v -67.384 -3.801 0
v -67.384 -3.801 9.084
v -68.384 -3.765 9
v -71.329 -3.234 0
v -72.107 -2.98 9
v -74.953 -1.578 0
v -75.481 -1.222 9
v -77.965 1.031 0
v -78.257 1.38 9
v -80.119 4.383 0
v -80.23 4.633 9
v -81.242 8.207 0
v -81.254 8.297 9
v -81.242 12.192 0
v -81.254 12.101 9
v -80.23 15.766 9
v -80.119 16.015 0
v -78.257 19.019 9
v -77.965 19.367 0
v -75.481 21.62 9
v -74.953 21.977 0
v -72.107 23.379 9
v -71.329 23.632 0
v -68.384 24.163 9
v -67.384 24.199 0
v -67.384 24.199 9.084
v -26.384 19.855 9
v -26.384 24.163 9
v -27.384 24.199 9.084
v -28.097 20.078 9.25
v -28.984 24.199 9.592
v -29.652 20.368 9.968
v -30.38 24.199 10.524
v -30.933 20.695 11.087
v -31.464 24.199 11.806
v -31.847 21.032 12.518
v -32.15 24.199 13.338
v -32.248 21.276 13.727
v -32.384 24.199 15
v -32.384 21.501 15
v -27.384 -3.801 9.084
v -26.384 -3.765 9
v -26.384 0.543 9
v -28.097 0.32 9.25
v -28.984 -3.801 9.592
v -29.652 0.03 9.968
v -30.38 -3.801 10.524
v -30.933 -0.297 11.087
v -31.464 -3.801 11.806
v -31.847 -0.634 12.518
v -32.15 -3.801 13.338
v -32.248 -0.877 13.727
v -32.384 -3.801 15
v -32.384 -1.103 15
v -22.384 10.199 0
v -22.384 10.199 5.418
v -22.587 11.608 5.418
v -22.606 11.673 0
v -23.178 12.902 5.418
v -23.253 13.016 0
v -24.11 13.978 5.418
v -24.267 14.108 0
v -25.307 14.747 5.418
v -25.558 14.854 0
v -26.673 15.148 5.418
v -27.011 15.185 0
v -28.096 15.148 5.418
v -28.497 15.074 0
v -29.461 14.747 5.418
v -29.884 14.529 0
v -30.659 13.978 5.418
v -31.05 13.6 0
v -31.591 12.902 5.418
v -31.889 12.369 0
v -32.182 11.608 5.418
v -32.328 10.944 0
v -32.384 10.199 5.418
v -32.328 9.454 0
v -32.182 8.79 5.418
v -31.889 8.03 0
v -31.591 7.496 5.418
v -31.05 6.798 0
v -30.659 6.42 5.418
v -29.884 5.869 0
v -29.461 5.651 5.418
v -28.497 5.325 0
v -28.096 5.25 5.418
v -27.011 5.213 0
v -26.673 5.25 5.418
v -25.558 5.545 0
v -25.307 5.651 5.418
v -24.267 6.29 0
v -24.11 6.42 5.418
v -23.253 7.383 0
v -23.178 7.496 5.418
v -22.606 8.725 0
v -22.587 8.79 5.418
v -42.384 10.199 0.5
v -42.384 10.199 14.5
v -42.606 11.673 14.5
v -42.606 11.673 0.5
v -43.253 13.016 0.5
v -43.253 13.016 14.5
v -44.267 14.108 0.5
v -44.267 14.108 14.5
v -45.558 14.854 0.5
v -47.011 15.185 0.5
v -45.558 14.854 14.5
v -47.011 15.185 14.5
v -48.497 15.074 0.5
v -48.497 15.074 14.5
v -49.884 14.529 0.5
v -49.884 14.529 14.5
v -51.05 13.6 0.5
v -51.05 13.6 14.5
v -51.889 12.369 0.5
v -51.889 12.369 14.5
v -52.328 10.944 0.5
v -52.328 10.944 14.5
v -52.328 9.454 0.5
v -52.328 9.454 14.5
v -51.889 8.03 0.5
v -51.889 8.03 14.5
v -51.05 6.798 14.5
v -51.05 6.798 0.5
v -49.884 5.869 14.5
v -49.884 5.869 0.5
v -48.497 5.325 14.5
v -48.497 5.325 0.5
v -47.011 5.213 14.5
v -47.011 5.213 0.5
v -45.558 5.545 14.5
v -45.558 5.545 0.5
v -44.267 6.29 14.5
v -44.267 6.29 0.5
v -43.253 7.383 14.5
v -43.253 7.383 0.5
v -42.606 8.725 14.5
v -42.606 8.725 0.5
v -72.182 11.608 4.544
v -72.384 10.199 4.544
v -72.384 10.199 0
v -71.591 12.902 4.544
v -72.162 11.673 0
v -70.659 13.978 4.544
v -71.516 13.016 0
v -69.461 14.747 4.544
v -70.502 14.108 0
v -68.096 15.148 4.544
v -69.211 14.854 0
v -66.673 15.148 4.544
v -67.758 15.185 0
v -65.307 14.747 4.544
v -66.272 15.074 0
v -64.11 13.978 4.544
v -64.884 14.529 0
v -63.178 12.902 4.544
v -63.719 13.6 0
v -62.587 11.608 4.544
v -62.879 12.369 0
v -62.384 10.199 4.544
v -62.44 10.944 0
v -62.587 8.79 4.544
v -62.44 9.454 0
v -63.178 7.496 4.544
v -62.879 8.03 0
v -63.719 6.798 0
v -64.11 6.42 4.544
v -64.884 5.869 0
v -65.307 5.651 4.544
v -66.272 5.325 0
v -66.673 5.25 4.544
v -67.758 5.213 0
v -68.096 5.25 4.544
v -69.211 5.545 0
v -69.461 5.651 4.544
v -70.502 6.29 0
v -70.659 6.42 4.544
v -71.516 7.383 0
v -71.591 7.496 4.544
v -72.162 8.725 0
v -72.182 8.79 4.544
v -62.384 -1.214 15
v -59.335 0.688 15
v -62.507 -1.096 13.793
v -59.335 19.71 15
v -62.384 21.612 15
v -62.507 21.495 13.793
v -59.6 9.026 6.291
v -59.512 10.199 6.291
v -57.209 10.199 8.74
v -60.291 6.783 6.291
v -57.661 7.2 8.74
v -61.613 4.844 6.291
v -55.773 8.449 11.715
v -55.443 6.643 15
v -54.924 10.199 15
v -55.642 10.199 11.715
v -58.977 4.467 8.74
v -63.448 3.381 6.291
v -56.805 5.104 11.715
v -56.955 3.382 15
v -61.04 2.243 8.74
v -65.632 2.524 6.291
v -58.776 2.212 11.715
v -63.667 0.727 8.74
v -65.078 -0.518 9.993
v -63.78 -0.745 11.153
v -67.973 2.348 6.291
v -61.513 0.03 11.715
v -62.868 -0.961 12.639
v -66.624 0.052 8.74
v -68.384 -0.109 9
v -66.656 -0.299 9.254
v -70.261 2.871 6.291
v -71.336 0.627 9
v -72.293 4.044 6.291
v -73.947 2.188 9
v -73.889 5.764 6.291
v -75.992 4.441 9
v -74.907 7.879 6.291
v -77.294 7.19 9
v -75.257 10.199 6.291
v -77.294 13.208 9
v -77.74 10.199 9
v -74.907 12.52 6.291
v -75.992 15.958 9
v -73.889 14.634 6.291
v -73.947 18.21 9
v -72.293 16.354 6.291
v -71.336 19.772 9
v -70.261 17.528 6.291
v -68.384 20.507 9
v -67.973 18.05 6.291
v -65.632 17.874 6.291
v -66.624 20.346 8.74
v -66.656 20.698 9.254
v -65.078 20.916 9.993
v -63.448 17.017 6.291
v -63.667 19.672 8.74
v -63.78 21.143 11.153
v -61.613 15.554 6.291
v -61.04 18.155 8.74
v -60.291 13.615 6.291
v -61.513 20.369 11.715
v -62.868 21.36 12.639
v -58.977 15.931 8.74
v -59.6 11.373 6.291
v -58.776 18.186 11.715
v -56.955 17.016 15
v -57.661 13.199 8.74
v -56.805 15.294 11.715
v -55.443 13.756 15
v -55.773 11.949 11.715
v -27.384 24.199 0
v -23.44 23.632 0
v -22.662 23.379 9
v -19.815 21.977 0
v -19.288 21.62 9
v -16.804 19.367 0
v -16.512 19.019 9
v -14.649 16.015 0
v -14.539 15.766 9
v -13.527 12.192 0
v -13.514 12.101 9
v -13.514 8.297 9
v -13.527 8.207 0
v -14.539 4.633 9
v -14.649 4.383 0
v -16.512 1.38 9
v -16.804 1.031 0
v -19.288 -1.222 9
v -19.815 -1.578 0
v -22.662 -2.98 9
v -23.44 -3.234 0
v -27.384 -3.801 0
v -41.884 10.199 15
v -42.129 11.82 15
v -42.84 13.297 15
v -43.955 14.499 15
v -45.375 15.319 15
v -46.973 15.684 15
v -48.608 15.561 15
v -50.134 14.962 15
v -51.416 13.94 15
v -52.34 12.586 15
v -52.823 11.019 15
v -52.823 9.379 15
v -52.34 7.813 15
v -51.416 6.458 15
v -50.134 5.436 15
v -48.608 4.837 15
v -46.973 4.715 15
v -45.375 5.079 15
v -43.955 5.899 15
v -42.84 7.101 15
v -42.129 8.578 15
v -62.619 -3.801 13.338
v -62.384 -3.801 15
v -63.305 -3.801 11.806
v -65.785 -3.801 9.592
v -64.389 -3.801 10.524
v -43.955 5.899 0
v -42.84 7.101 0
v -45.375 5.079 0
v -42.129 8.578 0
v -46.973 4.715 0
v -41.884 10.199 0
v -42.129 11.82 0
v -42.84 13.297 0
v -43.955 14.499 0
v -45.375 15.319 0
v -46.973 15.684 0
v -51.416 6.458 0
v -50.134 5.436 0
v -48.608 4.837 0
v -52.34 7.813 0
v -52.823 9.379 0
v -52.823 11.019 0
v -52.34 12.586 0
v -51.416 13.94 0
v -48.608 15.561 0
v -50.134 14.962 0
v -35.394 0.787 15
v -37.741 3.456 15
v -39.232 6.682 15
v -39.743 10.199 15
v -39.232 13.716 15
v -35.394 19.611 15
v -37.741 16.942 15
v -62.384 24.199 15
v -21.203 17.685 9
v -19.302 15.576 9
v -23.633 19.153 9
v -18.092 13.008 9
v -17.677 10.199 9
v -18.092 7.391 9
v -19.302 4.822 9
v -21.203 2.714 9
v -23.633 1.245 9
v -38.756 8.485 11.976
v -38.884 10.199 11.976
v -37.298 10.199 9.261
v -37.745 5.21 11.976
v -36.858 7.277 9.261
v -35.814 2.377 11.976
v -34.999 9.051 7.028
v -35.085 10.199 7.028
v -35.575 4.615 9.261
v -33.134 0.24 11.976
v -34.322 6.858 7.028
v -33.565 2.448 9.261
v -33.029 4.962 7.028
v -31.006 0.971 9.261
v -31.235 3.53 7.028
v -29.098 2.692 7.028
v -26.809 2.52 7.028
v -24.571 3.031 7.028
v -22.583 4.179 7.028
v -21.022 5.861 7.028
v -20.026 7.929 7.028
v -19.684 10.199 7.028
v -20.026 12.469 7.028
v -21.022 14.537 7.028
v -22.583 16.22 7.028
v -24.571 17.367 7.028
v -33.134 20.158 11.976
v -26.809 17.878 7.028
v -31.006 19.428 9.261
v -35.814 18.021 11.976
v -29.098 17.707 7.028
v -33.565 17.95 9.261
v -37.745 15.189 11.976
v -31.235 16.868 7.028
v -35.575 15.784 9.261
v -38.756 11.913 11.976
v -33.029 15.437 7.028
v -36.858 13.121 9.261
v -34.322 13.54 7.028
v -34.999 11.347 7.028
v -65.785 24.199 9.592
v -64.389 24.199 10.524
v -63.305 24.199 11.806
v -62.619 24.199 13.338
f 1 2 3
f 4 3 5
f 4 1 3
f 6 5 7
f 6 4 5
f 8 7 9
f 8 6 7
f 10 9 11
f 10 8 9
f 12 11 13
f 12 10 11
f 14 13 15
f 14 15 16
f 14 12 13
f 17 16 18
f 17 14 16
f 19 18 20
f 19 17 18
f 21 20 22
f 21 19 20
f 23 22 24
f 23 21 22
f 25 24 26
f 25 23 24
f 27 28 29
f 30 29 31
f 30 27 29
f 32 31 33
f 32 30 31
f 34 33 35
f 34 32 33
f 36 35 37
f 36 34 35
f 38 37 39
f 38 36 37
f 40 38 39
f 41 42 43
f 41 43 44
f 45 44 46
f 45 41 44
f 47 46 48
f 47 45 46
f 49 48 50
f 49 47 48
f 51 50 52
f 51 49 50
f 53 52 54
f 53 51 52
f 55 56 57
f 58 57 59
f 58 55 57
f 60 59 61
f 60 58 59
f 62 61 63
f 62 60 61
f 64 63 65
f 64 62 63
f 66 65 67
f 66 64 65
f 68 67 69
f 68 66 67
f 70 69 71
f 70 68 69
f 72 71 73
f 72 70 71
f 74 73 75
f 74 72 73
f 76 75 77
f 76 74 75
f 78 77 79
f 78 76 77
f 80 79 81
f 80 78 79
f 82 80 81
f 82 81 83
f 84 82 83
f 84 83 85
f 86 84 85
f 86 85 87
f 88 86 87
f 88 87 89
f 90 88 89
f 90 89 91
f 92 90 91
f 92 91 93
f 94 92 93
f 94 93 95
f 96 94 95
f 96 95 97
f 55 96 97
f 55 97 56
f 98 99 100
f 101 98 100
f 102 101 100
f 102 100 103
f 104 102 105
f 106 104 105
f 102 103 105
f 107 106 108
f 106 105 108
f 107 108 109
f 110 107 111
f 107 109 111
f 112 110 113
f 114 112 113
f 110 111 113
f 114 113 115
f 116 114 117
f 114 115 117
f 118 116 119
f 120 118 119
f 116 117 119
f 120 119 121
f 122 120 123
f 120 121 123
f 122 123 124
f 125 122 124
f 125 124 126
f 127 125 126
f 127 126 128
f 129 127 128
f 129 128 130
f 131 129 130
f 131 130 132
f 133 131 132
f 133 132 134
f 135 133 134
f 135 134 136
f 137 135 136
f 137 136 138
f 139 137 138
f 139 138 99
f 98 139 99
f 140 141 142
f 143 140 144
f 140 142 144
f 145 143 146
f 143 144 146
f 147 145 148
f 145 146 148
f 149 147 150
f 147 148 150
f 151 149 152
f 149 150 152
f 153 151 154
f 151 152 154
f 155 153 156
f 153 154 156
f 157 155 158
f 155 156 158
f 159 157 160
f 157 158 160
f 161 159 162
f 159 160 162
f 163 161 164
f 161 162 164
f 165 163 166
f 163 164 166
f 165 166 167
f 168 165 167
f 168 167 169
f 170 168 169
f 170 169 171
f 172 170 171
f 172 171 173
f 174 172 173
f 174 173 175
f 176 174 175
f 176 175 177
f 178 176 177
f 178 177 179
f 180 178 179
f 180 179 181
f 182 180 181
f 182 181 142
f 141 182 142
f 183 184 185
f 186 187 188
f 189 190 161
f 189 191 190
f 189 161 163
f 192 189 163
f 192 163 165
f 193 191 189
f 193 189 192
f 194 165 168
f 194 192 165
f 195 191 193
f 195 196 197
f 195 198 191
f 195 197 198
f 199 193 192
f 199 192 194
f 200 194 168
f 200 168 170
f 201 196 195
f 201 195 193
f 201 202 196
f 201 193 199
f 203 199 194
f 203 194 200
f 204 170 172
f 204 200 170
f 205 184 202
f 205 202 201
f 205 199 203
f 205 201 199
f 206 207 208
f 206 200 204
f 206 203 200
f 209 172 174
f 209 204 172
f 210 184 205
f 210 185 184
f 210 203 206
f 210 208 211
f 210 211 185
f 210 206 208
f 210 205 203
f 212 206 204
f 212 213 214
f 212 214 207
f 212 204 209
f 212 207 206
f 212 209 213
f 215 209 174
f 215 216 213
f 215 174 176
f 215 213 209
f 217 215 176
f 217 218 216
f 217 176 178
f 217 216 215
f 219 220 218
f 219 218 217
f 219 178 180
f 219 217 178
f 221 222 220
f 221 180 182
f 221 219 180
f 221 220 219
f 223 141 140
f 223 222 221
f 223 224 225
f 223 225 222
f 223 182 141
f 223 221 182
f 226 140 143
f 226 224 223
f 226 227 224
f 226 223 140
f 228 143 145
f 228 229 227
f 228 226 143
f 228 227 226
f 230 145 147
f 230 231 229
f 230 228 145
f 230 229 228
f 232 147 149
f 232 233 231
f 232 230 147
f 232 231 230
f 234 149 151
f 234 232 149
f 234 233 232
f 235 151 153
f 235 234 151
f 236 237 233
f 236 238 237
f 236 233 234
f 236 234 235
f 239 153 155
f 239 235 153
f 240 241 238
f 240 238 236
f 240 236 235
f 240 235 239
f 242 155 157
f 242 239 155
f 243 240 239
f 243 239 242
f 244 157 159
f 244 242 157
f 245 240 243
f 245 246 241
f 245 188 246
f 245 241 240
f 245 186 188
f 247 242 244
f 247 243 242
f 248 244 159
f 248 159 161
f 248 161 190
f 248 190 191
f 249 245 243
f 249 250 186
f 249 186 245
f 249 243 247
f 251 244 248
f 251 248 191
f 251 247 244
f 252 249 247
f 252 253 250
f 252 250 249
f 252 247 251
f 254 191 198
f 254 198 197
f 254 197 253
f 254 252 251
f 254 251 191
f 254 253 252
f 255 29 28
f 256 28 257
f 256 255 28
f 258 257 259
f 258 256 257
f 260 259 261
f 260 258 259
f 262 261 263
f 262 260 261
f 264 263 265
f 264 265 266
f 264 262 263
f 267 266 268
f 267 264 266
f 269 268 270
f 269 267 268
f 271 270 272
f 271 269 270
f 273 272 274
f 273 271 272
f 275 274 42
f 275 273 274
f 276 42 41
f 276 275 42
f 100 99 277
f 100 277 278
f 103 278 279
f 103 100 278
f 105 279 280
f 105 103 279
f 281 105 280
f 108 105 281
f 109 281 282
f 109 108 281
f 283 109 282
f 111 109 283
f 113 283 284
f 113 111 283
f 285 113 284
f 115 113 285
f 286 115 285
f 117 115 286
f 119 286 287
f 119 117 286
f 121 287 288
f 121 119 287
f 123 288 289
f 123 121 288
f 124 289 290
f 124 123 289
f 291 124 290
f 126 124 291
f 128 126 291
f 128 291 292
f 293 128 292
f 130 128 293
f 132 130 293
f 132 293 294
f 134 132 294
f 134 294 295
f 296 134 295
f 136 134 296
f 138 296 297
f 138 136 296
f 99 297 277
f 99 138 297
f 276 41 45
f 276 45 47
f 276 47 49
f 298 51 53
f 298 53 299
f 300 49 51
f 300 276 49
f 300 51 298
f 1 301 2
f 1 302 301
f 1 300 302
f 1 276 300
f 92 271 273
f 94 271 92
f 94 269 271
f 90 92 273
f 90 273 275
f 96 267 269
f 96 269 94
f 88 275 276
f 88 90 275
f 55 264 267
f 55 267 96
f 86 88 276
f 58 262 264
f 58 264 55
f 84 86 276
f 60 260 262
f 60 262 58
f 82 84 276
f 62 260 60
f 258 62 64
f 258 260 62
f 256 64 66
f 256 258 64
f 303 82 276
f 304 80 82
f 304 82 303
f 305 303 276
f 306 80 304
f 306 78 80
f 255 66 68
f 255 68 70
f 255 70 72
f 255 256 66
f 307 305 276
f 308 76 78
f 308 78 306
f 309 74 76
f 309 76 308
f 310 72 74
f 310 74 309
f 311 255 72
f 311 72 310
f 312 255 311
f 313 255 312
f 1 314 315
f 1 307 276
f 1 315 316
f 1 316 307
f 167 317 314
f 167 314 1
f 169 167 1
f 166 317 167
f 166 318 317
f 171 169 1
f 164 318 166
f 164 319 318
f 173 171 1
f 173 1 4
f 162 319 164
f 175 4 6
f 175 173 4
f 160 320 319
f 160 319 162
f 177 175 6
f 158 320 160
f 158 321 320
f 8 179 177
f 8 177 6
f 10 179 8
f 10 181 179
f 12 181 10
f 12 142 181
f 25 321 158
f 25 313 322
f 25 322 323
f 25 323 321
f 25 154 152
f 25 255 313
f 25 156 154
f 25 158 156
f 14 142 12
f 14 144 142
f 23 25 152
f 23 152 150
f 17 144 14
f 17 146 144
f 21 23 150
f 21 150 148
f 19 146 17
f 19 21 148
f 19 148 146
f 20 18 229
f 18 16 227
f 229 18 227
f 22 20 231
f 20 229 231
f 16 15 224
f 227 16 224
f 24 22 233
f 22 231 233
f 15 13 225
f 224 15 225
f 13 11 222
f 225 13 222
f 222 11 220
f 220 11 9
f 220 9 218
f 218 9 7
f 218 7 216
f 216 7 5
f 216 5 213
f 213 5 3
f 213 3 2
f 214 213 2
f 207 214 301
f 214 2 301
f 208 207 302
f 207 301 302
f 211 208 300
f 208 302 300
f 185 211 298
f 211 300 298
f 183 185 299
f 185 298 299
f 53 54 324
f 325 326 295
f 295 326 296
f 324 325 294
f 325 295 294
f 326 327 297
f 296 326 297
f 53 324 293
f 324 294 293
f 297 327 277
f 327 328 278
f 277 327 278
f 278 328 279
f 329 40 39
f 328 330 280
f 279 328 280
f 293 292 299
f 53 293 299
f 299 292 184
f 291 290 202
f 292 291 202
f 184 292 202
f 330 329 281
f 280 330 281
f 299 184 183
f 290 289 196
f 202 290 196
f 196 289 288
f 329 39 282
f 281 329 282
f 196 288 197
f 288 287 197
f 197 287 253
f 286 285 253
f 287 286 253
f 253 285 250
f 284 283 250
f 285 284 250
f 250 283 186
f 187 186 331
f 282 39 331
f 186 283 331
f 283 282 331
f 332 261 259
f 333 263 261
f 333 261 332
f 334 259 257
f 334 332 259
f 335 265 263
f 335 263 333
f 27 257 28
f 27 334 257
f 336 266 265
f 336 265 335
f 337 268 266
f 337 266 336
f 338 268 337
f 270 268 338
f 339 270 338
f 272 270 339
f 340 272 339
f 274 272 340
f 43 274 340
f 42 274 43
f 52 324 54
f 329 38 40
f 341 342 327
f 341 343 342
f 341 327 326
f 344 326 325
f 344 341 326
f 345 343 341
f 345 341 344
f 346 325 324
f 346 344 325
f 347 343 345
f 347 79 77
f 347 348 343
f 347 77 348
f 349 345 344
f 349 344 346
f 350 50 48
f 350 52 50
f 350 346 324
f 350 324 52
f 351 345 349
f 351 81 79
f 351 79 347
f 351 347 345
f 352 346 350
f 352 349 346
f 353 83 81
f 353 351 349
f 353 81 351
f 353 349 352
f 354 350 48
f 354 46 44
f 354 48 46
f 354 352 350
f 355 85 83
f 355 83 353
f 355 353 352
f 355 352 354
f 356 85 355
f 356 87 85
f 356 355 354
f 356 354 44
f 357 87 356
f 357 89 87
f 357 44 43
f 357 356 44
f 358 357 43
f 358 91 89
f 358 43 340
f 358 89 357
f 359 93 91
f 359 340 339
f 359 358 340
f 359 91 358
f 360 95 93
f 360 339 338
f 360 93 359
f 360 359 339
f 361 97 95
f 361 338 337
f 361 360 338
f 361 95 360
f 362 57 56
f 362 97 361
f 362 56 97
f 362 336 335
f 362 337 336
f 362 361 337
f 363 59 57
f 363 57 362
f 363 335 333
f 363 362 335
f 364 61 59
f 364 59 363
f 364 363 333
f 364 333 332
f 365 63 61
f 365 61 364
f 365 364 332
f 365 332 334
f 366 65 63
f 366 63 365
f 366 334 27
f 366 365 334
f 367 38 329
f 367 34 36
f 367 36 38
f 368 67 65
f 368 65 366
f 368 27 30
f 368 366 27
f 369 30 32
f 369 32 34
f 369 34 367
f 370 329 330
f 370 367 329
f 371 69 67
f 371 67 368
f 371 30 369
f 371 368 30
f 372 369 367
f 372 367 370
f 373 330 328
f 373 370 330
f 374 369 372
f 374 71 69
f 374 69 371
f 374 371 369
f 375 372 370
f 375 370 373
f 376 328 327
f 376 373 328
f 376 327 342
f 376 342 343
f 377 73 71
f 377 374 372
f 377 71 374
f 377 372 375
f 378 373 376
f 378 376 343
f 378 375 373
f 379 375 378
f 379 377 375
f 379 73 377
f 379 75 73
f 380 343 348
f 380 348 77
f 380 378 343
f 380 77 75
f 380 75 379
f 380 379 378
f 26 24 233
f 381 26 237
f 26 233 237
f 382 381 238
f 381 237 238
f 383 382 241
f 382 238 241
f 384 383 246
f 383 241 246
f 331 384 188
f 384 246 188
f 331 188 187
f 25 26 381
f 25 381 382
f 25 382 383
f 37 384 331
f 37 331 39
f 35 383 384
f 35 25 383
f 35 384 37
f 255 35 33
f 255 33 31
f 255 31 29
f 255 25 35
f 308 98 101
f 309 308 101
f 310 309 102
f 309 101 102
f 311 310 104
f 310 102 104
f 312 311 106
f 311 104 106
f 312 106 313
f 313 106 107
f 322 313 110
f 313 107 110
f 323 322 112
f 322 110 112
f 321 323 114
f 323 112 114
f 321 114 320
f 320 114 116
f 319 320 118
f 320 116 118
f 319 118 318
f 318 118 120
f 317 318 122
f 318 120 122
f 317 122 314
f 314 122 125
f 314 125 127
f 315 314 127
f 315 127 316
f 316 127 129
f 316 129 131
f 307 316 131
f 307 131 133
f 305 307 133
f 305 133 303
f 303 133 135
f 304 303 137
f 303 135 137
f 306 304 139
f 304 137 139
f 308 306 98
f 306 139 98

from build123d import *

# Parameters (mm, degrees)
BOSS_EXTRU_1_DEPTH           = 15
ENL_V_MAT_EXTRU_2_REACH      = 89.364
ENL_V_MAT_EXTRU_3_REACH      = 88.221
ESQUISSE8_R                  = 5
CHANFREIN1_SIZE              = 0.5
ENL_V_MAT_EXTRU_4_REACH      = 88.221
ENL_V_MAT_EXTRU_4_END_RADIUS = 12.5
ESQUISSE9_R                  = 5
SYM_TRIE2_OUTLINE_R          = 5
SYM_TRIE2_DEPTH              = 5.418281221


# Read off the part's stored shape, not the designer's step: Symétrie2
with BuildPart() as part:
    # Esquisse1 → Boss.-Extru.1 (new body)
    with BuildSketch(Plane.XY):
        with BuildLine():
            Line((-67.384328638, 24.199161074), (-27.384328638, 24.199161074))
            ThreePointArc((-27.384328638, 24.199161074), (-13.384328638, 10.199161074), (-27.384328638, -3.800838926))
            Line((-27.384328638, -3.800838926), (-67.384328638, -3.800838926))
            ThreePointArc((-67.384328638, -3.800838926), (-81.384328638, 10.199161074), (-67.384328638, 24.199161074))
        make_face()
    extrude(amount=BOSS_EXTRU_1_DEPTH)

    # Esquisse3 → Enlèvement de matière-Révolution1 (revolve, cut)
    with BuildSketch(Plane(origin=(0, 10.199161074, 0), x_dir=(-1, 0, 0), z_dir=(0, 1, 0))):
        with BuildLine():
            Line((67.384328638, 28.5), (67.384328638, 3.5))
            ThreePointArc((67.384328638, 3.5), (54.884328638, 16), (67.384328638, 28.5))
        make_face()
    revolve(axis=Axis((-67.384328638, 10.199161074, 28.5), (0, 0, -1)), mode=Mode.SUBTRACT)

    # Esquisse4 → Enlèvement de matière-Révolution2 (revolve, cut)
    with BuildSketch(Plane(origin=(0, 10.199161074, 0), x_dir=(-1, 0, 0), z_dir=(0, 1, 0))):
        with BuildLine():
            Line((27.384328638, 4.374720358), (27.384328638, 29.374720358))
            ThreePointArc((27.384328638, 29.374720358), (39.884328638, 16.874720358), (27.384328638, 4.374720358))
        make_face()
    revolve(axis=Axis((-27.384328638, 10.199161074, 4.374720358), (0, 0, 1)), mode=Mode.SUBTRACT)

    # Esquisse5 → Enlèv. mat.-Extru.2 (cut, up to next)
    with BuildSketch(Plane.XZ.offset(3.800838926), mode=Mode.PRIVATE) as enl_v_mat_extru_2_sk1:
        with BuildLine():
            Line((-63.278251084, 15), (-87.523217527, 15))
            Line((-87.523217527, 15), (-87.523217527, 9))
            Line((-87.523217527, 9), (-68.384328638, 9))
            ThreePointArc((-68.384328638, 9), (-64.141687951, 10.757359313), (-62.384328638, 15))
            Line((-62.384328638, 15), (-63.278251084, 15))
        make_face()
    enl_v_mat_extru_2_tool1 = extrude(enl_v_mat_extru_2_sk1.sketch, amount=-ENL_V_MAT_EXTRU_2_REACH, mode=Mode.PRIVATE) & part.part
    enl_v_mat_extru_2 = enl_v_mat_extru_2_tool1.solids().sort_by_distance((-75.559983, -3.800839, 12.089604))[0]
    add(enl_v_mat_extru_2, mode=Mode.SUBTRACT)

    # Symétrie1: Enlèv. mat.-Extru.2 mirrored; each copy of Enlèv. mat.-Extru.2 runs up to whatever stops it at its own place
    sym_trie1_before = part.part  # the part as the pattern finds it: every copy runs up to it
    sym_trie1_enl_v_mat_extru_2_long = extrude(enl_v_mat_extru_2_sk1.sketch, amount=-ENL_V_MAT_EXTRU_2_REACH, mode=Mode.PRIVATE)
    sym_trie1_enl_v_mat_extru_2_tool1 = sym_trie1_enl_v_mat_extru_2_long.mirror(Plane.ZY.offset(47.384328638)) & sym_trie1_before
    add(sym_trie1_enl_v_mat_extru_2_tool1.solids().sort_by_distance((-19.208674, -3.800839, 12.089604))[0], mode=Mode.SUBTRACT)

    # Esquisse8 → Enlèv. mat.-Extru.3 (cut, up to next)
    with BuildSketch(Plane.XY.offset(15), mode=Mode.PRIVATE) as enl_v_mat_extru_3_sk1:
        with Locations((-47.384328638, 10.199161074)):
            Circle(ESQUISSE8_R)
    enl_v_mat_extru_3_tool1 = extrude(enl_v_mat_extru_3_sk1.sketch, amount=-ENL_V_MAT_EXTRU_3_REACH, mode=Mode.PRIVATE) & part.part
    add(enl_v_mat_extru_3_tool1.solids().sort_by_distance((-47.384329, 10.199161, 15))[0], mode=Mode.SUBTRACT)

    # Chanfrein1
    chanfrein1_edges = [part.edges().sort_by_distance(p)[0] for p in [
        (-52.384328638, 10.199161074, 15),
        (-52.384328638, 10.199161074, 0),
    ]]
    chamfer(chanfrein1_edges, length=CHANFREIN1_SIZE)

    # Enlèv. mat.-Extru.4: up to this sphere (the profile starts outside it)
    enl_v_mat_extru_4_end = Location((-67.384328638, 10.199161074, 16)) * Sphere(ENL_V_MAT_EXTRU_4_END_RADIUS, mode=Mode.PRIVATE)
    # Esquisse9 → Enlèv. mat.-Extru.4 (cut, up to the surface)
    with BuildSketch(Plane(origin=(0, 0, 0), x_dir=(-1, 0, 0), z_dir=(0, 0, -1)), mode=Mode.PRIVATE) as enl_v_mat_extru_4_sk1:
        with Locations((67.384328638, 10.199161074)):
            Circle(ESQUISSE9_R)
    enl_v_mat_extru_4_tool1 = extrude(enl_v_mat_extru_4_sk1.sketch, amount=-ENL_V_MAT_EXTRU_4_REACH, mode=Mode.PRIVATE) - enl_v_mat_extru_4_end
    add(enl_v_mat_extru_4_tool1.solids().sort_by_distance((-67.384329, 10.199161, 0))[0], mode=Mode.SUBTRACT)

    # Symétrie2 outline → Symétrie2 (cut)
    with BuildSketch(Plane.XY):
        with Locations((-27.384328638, 10.199161074)):
            Circle(SYM_TRIE2_OUTLINE_R)
    extrude(amount=SYM_TRIE2_DEPTH, mode=Mode.SUBTRACT)


solid = part.part
